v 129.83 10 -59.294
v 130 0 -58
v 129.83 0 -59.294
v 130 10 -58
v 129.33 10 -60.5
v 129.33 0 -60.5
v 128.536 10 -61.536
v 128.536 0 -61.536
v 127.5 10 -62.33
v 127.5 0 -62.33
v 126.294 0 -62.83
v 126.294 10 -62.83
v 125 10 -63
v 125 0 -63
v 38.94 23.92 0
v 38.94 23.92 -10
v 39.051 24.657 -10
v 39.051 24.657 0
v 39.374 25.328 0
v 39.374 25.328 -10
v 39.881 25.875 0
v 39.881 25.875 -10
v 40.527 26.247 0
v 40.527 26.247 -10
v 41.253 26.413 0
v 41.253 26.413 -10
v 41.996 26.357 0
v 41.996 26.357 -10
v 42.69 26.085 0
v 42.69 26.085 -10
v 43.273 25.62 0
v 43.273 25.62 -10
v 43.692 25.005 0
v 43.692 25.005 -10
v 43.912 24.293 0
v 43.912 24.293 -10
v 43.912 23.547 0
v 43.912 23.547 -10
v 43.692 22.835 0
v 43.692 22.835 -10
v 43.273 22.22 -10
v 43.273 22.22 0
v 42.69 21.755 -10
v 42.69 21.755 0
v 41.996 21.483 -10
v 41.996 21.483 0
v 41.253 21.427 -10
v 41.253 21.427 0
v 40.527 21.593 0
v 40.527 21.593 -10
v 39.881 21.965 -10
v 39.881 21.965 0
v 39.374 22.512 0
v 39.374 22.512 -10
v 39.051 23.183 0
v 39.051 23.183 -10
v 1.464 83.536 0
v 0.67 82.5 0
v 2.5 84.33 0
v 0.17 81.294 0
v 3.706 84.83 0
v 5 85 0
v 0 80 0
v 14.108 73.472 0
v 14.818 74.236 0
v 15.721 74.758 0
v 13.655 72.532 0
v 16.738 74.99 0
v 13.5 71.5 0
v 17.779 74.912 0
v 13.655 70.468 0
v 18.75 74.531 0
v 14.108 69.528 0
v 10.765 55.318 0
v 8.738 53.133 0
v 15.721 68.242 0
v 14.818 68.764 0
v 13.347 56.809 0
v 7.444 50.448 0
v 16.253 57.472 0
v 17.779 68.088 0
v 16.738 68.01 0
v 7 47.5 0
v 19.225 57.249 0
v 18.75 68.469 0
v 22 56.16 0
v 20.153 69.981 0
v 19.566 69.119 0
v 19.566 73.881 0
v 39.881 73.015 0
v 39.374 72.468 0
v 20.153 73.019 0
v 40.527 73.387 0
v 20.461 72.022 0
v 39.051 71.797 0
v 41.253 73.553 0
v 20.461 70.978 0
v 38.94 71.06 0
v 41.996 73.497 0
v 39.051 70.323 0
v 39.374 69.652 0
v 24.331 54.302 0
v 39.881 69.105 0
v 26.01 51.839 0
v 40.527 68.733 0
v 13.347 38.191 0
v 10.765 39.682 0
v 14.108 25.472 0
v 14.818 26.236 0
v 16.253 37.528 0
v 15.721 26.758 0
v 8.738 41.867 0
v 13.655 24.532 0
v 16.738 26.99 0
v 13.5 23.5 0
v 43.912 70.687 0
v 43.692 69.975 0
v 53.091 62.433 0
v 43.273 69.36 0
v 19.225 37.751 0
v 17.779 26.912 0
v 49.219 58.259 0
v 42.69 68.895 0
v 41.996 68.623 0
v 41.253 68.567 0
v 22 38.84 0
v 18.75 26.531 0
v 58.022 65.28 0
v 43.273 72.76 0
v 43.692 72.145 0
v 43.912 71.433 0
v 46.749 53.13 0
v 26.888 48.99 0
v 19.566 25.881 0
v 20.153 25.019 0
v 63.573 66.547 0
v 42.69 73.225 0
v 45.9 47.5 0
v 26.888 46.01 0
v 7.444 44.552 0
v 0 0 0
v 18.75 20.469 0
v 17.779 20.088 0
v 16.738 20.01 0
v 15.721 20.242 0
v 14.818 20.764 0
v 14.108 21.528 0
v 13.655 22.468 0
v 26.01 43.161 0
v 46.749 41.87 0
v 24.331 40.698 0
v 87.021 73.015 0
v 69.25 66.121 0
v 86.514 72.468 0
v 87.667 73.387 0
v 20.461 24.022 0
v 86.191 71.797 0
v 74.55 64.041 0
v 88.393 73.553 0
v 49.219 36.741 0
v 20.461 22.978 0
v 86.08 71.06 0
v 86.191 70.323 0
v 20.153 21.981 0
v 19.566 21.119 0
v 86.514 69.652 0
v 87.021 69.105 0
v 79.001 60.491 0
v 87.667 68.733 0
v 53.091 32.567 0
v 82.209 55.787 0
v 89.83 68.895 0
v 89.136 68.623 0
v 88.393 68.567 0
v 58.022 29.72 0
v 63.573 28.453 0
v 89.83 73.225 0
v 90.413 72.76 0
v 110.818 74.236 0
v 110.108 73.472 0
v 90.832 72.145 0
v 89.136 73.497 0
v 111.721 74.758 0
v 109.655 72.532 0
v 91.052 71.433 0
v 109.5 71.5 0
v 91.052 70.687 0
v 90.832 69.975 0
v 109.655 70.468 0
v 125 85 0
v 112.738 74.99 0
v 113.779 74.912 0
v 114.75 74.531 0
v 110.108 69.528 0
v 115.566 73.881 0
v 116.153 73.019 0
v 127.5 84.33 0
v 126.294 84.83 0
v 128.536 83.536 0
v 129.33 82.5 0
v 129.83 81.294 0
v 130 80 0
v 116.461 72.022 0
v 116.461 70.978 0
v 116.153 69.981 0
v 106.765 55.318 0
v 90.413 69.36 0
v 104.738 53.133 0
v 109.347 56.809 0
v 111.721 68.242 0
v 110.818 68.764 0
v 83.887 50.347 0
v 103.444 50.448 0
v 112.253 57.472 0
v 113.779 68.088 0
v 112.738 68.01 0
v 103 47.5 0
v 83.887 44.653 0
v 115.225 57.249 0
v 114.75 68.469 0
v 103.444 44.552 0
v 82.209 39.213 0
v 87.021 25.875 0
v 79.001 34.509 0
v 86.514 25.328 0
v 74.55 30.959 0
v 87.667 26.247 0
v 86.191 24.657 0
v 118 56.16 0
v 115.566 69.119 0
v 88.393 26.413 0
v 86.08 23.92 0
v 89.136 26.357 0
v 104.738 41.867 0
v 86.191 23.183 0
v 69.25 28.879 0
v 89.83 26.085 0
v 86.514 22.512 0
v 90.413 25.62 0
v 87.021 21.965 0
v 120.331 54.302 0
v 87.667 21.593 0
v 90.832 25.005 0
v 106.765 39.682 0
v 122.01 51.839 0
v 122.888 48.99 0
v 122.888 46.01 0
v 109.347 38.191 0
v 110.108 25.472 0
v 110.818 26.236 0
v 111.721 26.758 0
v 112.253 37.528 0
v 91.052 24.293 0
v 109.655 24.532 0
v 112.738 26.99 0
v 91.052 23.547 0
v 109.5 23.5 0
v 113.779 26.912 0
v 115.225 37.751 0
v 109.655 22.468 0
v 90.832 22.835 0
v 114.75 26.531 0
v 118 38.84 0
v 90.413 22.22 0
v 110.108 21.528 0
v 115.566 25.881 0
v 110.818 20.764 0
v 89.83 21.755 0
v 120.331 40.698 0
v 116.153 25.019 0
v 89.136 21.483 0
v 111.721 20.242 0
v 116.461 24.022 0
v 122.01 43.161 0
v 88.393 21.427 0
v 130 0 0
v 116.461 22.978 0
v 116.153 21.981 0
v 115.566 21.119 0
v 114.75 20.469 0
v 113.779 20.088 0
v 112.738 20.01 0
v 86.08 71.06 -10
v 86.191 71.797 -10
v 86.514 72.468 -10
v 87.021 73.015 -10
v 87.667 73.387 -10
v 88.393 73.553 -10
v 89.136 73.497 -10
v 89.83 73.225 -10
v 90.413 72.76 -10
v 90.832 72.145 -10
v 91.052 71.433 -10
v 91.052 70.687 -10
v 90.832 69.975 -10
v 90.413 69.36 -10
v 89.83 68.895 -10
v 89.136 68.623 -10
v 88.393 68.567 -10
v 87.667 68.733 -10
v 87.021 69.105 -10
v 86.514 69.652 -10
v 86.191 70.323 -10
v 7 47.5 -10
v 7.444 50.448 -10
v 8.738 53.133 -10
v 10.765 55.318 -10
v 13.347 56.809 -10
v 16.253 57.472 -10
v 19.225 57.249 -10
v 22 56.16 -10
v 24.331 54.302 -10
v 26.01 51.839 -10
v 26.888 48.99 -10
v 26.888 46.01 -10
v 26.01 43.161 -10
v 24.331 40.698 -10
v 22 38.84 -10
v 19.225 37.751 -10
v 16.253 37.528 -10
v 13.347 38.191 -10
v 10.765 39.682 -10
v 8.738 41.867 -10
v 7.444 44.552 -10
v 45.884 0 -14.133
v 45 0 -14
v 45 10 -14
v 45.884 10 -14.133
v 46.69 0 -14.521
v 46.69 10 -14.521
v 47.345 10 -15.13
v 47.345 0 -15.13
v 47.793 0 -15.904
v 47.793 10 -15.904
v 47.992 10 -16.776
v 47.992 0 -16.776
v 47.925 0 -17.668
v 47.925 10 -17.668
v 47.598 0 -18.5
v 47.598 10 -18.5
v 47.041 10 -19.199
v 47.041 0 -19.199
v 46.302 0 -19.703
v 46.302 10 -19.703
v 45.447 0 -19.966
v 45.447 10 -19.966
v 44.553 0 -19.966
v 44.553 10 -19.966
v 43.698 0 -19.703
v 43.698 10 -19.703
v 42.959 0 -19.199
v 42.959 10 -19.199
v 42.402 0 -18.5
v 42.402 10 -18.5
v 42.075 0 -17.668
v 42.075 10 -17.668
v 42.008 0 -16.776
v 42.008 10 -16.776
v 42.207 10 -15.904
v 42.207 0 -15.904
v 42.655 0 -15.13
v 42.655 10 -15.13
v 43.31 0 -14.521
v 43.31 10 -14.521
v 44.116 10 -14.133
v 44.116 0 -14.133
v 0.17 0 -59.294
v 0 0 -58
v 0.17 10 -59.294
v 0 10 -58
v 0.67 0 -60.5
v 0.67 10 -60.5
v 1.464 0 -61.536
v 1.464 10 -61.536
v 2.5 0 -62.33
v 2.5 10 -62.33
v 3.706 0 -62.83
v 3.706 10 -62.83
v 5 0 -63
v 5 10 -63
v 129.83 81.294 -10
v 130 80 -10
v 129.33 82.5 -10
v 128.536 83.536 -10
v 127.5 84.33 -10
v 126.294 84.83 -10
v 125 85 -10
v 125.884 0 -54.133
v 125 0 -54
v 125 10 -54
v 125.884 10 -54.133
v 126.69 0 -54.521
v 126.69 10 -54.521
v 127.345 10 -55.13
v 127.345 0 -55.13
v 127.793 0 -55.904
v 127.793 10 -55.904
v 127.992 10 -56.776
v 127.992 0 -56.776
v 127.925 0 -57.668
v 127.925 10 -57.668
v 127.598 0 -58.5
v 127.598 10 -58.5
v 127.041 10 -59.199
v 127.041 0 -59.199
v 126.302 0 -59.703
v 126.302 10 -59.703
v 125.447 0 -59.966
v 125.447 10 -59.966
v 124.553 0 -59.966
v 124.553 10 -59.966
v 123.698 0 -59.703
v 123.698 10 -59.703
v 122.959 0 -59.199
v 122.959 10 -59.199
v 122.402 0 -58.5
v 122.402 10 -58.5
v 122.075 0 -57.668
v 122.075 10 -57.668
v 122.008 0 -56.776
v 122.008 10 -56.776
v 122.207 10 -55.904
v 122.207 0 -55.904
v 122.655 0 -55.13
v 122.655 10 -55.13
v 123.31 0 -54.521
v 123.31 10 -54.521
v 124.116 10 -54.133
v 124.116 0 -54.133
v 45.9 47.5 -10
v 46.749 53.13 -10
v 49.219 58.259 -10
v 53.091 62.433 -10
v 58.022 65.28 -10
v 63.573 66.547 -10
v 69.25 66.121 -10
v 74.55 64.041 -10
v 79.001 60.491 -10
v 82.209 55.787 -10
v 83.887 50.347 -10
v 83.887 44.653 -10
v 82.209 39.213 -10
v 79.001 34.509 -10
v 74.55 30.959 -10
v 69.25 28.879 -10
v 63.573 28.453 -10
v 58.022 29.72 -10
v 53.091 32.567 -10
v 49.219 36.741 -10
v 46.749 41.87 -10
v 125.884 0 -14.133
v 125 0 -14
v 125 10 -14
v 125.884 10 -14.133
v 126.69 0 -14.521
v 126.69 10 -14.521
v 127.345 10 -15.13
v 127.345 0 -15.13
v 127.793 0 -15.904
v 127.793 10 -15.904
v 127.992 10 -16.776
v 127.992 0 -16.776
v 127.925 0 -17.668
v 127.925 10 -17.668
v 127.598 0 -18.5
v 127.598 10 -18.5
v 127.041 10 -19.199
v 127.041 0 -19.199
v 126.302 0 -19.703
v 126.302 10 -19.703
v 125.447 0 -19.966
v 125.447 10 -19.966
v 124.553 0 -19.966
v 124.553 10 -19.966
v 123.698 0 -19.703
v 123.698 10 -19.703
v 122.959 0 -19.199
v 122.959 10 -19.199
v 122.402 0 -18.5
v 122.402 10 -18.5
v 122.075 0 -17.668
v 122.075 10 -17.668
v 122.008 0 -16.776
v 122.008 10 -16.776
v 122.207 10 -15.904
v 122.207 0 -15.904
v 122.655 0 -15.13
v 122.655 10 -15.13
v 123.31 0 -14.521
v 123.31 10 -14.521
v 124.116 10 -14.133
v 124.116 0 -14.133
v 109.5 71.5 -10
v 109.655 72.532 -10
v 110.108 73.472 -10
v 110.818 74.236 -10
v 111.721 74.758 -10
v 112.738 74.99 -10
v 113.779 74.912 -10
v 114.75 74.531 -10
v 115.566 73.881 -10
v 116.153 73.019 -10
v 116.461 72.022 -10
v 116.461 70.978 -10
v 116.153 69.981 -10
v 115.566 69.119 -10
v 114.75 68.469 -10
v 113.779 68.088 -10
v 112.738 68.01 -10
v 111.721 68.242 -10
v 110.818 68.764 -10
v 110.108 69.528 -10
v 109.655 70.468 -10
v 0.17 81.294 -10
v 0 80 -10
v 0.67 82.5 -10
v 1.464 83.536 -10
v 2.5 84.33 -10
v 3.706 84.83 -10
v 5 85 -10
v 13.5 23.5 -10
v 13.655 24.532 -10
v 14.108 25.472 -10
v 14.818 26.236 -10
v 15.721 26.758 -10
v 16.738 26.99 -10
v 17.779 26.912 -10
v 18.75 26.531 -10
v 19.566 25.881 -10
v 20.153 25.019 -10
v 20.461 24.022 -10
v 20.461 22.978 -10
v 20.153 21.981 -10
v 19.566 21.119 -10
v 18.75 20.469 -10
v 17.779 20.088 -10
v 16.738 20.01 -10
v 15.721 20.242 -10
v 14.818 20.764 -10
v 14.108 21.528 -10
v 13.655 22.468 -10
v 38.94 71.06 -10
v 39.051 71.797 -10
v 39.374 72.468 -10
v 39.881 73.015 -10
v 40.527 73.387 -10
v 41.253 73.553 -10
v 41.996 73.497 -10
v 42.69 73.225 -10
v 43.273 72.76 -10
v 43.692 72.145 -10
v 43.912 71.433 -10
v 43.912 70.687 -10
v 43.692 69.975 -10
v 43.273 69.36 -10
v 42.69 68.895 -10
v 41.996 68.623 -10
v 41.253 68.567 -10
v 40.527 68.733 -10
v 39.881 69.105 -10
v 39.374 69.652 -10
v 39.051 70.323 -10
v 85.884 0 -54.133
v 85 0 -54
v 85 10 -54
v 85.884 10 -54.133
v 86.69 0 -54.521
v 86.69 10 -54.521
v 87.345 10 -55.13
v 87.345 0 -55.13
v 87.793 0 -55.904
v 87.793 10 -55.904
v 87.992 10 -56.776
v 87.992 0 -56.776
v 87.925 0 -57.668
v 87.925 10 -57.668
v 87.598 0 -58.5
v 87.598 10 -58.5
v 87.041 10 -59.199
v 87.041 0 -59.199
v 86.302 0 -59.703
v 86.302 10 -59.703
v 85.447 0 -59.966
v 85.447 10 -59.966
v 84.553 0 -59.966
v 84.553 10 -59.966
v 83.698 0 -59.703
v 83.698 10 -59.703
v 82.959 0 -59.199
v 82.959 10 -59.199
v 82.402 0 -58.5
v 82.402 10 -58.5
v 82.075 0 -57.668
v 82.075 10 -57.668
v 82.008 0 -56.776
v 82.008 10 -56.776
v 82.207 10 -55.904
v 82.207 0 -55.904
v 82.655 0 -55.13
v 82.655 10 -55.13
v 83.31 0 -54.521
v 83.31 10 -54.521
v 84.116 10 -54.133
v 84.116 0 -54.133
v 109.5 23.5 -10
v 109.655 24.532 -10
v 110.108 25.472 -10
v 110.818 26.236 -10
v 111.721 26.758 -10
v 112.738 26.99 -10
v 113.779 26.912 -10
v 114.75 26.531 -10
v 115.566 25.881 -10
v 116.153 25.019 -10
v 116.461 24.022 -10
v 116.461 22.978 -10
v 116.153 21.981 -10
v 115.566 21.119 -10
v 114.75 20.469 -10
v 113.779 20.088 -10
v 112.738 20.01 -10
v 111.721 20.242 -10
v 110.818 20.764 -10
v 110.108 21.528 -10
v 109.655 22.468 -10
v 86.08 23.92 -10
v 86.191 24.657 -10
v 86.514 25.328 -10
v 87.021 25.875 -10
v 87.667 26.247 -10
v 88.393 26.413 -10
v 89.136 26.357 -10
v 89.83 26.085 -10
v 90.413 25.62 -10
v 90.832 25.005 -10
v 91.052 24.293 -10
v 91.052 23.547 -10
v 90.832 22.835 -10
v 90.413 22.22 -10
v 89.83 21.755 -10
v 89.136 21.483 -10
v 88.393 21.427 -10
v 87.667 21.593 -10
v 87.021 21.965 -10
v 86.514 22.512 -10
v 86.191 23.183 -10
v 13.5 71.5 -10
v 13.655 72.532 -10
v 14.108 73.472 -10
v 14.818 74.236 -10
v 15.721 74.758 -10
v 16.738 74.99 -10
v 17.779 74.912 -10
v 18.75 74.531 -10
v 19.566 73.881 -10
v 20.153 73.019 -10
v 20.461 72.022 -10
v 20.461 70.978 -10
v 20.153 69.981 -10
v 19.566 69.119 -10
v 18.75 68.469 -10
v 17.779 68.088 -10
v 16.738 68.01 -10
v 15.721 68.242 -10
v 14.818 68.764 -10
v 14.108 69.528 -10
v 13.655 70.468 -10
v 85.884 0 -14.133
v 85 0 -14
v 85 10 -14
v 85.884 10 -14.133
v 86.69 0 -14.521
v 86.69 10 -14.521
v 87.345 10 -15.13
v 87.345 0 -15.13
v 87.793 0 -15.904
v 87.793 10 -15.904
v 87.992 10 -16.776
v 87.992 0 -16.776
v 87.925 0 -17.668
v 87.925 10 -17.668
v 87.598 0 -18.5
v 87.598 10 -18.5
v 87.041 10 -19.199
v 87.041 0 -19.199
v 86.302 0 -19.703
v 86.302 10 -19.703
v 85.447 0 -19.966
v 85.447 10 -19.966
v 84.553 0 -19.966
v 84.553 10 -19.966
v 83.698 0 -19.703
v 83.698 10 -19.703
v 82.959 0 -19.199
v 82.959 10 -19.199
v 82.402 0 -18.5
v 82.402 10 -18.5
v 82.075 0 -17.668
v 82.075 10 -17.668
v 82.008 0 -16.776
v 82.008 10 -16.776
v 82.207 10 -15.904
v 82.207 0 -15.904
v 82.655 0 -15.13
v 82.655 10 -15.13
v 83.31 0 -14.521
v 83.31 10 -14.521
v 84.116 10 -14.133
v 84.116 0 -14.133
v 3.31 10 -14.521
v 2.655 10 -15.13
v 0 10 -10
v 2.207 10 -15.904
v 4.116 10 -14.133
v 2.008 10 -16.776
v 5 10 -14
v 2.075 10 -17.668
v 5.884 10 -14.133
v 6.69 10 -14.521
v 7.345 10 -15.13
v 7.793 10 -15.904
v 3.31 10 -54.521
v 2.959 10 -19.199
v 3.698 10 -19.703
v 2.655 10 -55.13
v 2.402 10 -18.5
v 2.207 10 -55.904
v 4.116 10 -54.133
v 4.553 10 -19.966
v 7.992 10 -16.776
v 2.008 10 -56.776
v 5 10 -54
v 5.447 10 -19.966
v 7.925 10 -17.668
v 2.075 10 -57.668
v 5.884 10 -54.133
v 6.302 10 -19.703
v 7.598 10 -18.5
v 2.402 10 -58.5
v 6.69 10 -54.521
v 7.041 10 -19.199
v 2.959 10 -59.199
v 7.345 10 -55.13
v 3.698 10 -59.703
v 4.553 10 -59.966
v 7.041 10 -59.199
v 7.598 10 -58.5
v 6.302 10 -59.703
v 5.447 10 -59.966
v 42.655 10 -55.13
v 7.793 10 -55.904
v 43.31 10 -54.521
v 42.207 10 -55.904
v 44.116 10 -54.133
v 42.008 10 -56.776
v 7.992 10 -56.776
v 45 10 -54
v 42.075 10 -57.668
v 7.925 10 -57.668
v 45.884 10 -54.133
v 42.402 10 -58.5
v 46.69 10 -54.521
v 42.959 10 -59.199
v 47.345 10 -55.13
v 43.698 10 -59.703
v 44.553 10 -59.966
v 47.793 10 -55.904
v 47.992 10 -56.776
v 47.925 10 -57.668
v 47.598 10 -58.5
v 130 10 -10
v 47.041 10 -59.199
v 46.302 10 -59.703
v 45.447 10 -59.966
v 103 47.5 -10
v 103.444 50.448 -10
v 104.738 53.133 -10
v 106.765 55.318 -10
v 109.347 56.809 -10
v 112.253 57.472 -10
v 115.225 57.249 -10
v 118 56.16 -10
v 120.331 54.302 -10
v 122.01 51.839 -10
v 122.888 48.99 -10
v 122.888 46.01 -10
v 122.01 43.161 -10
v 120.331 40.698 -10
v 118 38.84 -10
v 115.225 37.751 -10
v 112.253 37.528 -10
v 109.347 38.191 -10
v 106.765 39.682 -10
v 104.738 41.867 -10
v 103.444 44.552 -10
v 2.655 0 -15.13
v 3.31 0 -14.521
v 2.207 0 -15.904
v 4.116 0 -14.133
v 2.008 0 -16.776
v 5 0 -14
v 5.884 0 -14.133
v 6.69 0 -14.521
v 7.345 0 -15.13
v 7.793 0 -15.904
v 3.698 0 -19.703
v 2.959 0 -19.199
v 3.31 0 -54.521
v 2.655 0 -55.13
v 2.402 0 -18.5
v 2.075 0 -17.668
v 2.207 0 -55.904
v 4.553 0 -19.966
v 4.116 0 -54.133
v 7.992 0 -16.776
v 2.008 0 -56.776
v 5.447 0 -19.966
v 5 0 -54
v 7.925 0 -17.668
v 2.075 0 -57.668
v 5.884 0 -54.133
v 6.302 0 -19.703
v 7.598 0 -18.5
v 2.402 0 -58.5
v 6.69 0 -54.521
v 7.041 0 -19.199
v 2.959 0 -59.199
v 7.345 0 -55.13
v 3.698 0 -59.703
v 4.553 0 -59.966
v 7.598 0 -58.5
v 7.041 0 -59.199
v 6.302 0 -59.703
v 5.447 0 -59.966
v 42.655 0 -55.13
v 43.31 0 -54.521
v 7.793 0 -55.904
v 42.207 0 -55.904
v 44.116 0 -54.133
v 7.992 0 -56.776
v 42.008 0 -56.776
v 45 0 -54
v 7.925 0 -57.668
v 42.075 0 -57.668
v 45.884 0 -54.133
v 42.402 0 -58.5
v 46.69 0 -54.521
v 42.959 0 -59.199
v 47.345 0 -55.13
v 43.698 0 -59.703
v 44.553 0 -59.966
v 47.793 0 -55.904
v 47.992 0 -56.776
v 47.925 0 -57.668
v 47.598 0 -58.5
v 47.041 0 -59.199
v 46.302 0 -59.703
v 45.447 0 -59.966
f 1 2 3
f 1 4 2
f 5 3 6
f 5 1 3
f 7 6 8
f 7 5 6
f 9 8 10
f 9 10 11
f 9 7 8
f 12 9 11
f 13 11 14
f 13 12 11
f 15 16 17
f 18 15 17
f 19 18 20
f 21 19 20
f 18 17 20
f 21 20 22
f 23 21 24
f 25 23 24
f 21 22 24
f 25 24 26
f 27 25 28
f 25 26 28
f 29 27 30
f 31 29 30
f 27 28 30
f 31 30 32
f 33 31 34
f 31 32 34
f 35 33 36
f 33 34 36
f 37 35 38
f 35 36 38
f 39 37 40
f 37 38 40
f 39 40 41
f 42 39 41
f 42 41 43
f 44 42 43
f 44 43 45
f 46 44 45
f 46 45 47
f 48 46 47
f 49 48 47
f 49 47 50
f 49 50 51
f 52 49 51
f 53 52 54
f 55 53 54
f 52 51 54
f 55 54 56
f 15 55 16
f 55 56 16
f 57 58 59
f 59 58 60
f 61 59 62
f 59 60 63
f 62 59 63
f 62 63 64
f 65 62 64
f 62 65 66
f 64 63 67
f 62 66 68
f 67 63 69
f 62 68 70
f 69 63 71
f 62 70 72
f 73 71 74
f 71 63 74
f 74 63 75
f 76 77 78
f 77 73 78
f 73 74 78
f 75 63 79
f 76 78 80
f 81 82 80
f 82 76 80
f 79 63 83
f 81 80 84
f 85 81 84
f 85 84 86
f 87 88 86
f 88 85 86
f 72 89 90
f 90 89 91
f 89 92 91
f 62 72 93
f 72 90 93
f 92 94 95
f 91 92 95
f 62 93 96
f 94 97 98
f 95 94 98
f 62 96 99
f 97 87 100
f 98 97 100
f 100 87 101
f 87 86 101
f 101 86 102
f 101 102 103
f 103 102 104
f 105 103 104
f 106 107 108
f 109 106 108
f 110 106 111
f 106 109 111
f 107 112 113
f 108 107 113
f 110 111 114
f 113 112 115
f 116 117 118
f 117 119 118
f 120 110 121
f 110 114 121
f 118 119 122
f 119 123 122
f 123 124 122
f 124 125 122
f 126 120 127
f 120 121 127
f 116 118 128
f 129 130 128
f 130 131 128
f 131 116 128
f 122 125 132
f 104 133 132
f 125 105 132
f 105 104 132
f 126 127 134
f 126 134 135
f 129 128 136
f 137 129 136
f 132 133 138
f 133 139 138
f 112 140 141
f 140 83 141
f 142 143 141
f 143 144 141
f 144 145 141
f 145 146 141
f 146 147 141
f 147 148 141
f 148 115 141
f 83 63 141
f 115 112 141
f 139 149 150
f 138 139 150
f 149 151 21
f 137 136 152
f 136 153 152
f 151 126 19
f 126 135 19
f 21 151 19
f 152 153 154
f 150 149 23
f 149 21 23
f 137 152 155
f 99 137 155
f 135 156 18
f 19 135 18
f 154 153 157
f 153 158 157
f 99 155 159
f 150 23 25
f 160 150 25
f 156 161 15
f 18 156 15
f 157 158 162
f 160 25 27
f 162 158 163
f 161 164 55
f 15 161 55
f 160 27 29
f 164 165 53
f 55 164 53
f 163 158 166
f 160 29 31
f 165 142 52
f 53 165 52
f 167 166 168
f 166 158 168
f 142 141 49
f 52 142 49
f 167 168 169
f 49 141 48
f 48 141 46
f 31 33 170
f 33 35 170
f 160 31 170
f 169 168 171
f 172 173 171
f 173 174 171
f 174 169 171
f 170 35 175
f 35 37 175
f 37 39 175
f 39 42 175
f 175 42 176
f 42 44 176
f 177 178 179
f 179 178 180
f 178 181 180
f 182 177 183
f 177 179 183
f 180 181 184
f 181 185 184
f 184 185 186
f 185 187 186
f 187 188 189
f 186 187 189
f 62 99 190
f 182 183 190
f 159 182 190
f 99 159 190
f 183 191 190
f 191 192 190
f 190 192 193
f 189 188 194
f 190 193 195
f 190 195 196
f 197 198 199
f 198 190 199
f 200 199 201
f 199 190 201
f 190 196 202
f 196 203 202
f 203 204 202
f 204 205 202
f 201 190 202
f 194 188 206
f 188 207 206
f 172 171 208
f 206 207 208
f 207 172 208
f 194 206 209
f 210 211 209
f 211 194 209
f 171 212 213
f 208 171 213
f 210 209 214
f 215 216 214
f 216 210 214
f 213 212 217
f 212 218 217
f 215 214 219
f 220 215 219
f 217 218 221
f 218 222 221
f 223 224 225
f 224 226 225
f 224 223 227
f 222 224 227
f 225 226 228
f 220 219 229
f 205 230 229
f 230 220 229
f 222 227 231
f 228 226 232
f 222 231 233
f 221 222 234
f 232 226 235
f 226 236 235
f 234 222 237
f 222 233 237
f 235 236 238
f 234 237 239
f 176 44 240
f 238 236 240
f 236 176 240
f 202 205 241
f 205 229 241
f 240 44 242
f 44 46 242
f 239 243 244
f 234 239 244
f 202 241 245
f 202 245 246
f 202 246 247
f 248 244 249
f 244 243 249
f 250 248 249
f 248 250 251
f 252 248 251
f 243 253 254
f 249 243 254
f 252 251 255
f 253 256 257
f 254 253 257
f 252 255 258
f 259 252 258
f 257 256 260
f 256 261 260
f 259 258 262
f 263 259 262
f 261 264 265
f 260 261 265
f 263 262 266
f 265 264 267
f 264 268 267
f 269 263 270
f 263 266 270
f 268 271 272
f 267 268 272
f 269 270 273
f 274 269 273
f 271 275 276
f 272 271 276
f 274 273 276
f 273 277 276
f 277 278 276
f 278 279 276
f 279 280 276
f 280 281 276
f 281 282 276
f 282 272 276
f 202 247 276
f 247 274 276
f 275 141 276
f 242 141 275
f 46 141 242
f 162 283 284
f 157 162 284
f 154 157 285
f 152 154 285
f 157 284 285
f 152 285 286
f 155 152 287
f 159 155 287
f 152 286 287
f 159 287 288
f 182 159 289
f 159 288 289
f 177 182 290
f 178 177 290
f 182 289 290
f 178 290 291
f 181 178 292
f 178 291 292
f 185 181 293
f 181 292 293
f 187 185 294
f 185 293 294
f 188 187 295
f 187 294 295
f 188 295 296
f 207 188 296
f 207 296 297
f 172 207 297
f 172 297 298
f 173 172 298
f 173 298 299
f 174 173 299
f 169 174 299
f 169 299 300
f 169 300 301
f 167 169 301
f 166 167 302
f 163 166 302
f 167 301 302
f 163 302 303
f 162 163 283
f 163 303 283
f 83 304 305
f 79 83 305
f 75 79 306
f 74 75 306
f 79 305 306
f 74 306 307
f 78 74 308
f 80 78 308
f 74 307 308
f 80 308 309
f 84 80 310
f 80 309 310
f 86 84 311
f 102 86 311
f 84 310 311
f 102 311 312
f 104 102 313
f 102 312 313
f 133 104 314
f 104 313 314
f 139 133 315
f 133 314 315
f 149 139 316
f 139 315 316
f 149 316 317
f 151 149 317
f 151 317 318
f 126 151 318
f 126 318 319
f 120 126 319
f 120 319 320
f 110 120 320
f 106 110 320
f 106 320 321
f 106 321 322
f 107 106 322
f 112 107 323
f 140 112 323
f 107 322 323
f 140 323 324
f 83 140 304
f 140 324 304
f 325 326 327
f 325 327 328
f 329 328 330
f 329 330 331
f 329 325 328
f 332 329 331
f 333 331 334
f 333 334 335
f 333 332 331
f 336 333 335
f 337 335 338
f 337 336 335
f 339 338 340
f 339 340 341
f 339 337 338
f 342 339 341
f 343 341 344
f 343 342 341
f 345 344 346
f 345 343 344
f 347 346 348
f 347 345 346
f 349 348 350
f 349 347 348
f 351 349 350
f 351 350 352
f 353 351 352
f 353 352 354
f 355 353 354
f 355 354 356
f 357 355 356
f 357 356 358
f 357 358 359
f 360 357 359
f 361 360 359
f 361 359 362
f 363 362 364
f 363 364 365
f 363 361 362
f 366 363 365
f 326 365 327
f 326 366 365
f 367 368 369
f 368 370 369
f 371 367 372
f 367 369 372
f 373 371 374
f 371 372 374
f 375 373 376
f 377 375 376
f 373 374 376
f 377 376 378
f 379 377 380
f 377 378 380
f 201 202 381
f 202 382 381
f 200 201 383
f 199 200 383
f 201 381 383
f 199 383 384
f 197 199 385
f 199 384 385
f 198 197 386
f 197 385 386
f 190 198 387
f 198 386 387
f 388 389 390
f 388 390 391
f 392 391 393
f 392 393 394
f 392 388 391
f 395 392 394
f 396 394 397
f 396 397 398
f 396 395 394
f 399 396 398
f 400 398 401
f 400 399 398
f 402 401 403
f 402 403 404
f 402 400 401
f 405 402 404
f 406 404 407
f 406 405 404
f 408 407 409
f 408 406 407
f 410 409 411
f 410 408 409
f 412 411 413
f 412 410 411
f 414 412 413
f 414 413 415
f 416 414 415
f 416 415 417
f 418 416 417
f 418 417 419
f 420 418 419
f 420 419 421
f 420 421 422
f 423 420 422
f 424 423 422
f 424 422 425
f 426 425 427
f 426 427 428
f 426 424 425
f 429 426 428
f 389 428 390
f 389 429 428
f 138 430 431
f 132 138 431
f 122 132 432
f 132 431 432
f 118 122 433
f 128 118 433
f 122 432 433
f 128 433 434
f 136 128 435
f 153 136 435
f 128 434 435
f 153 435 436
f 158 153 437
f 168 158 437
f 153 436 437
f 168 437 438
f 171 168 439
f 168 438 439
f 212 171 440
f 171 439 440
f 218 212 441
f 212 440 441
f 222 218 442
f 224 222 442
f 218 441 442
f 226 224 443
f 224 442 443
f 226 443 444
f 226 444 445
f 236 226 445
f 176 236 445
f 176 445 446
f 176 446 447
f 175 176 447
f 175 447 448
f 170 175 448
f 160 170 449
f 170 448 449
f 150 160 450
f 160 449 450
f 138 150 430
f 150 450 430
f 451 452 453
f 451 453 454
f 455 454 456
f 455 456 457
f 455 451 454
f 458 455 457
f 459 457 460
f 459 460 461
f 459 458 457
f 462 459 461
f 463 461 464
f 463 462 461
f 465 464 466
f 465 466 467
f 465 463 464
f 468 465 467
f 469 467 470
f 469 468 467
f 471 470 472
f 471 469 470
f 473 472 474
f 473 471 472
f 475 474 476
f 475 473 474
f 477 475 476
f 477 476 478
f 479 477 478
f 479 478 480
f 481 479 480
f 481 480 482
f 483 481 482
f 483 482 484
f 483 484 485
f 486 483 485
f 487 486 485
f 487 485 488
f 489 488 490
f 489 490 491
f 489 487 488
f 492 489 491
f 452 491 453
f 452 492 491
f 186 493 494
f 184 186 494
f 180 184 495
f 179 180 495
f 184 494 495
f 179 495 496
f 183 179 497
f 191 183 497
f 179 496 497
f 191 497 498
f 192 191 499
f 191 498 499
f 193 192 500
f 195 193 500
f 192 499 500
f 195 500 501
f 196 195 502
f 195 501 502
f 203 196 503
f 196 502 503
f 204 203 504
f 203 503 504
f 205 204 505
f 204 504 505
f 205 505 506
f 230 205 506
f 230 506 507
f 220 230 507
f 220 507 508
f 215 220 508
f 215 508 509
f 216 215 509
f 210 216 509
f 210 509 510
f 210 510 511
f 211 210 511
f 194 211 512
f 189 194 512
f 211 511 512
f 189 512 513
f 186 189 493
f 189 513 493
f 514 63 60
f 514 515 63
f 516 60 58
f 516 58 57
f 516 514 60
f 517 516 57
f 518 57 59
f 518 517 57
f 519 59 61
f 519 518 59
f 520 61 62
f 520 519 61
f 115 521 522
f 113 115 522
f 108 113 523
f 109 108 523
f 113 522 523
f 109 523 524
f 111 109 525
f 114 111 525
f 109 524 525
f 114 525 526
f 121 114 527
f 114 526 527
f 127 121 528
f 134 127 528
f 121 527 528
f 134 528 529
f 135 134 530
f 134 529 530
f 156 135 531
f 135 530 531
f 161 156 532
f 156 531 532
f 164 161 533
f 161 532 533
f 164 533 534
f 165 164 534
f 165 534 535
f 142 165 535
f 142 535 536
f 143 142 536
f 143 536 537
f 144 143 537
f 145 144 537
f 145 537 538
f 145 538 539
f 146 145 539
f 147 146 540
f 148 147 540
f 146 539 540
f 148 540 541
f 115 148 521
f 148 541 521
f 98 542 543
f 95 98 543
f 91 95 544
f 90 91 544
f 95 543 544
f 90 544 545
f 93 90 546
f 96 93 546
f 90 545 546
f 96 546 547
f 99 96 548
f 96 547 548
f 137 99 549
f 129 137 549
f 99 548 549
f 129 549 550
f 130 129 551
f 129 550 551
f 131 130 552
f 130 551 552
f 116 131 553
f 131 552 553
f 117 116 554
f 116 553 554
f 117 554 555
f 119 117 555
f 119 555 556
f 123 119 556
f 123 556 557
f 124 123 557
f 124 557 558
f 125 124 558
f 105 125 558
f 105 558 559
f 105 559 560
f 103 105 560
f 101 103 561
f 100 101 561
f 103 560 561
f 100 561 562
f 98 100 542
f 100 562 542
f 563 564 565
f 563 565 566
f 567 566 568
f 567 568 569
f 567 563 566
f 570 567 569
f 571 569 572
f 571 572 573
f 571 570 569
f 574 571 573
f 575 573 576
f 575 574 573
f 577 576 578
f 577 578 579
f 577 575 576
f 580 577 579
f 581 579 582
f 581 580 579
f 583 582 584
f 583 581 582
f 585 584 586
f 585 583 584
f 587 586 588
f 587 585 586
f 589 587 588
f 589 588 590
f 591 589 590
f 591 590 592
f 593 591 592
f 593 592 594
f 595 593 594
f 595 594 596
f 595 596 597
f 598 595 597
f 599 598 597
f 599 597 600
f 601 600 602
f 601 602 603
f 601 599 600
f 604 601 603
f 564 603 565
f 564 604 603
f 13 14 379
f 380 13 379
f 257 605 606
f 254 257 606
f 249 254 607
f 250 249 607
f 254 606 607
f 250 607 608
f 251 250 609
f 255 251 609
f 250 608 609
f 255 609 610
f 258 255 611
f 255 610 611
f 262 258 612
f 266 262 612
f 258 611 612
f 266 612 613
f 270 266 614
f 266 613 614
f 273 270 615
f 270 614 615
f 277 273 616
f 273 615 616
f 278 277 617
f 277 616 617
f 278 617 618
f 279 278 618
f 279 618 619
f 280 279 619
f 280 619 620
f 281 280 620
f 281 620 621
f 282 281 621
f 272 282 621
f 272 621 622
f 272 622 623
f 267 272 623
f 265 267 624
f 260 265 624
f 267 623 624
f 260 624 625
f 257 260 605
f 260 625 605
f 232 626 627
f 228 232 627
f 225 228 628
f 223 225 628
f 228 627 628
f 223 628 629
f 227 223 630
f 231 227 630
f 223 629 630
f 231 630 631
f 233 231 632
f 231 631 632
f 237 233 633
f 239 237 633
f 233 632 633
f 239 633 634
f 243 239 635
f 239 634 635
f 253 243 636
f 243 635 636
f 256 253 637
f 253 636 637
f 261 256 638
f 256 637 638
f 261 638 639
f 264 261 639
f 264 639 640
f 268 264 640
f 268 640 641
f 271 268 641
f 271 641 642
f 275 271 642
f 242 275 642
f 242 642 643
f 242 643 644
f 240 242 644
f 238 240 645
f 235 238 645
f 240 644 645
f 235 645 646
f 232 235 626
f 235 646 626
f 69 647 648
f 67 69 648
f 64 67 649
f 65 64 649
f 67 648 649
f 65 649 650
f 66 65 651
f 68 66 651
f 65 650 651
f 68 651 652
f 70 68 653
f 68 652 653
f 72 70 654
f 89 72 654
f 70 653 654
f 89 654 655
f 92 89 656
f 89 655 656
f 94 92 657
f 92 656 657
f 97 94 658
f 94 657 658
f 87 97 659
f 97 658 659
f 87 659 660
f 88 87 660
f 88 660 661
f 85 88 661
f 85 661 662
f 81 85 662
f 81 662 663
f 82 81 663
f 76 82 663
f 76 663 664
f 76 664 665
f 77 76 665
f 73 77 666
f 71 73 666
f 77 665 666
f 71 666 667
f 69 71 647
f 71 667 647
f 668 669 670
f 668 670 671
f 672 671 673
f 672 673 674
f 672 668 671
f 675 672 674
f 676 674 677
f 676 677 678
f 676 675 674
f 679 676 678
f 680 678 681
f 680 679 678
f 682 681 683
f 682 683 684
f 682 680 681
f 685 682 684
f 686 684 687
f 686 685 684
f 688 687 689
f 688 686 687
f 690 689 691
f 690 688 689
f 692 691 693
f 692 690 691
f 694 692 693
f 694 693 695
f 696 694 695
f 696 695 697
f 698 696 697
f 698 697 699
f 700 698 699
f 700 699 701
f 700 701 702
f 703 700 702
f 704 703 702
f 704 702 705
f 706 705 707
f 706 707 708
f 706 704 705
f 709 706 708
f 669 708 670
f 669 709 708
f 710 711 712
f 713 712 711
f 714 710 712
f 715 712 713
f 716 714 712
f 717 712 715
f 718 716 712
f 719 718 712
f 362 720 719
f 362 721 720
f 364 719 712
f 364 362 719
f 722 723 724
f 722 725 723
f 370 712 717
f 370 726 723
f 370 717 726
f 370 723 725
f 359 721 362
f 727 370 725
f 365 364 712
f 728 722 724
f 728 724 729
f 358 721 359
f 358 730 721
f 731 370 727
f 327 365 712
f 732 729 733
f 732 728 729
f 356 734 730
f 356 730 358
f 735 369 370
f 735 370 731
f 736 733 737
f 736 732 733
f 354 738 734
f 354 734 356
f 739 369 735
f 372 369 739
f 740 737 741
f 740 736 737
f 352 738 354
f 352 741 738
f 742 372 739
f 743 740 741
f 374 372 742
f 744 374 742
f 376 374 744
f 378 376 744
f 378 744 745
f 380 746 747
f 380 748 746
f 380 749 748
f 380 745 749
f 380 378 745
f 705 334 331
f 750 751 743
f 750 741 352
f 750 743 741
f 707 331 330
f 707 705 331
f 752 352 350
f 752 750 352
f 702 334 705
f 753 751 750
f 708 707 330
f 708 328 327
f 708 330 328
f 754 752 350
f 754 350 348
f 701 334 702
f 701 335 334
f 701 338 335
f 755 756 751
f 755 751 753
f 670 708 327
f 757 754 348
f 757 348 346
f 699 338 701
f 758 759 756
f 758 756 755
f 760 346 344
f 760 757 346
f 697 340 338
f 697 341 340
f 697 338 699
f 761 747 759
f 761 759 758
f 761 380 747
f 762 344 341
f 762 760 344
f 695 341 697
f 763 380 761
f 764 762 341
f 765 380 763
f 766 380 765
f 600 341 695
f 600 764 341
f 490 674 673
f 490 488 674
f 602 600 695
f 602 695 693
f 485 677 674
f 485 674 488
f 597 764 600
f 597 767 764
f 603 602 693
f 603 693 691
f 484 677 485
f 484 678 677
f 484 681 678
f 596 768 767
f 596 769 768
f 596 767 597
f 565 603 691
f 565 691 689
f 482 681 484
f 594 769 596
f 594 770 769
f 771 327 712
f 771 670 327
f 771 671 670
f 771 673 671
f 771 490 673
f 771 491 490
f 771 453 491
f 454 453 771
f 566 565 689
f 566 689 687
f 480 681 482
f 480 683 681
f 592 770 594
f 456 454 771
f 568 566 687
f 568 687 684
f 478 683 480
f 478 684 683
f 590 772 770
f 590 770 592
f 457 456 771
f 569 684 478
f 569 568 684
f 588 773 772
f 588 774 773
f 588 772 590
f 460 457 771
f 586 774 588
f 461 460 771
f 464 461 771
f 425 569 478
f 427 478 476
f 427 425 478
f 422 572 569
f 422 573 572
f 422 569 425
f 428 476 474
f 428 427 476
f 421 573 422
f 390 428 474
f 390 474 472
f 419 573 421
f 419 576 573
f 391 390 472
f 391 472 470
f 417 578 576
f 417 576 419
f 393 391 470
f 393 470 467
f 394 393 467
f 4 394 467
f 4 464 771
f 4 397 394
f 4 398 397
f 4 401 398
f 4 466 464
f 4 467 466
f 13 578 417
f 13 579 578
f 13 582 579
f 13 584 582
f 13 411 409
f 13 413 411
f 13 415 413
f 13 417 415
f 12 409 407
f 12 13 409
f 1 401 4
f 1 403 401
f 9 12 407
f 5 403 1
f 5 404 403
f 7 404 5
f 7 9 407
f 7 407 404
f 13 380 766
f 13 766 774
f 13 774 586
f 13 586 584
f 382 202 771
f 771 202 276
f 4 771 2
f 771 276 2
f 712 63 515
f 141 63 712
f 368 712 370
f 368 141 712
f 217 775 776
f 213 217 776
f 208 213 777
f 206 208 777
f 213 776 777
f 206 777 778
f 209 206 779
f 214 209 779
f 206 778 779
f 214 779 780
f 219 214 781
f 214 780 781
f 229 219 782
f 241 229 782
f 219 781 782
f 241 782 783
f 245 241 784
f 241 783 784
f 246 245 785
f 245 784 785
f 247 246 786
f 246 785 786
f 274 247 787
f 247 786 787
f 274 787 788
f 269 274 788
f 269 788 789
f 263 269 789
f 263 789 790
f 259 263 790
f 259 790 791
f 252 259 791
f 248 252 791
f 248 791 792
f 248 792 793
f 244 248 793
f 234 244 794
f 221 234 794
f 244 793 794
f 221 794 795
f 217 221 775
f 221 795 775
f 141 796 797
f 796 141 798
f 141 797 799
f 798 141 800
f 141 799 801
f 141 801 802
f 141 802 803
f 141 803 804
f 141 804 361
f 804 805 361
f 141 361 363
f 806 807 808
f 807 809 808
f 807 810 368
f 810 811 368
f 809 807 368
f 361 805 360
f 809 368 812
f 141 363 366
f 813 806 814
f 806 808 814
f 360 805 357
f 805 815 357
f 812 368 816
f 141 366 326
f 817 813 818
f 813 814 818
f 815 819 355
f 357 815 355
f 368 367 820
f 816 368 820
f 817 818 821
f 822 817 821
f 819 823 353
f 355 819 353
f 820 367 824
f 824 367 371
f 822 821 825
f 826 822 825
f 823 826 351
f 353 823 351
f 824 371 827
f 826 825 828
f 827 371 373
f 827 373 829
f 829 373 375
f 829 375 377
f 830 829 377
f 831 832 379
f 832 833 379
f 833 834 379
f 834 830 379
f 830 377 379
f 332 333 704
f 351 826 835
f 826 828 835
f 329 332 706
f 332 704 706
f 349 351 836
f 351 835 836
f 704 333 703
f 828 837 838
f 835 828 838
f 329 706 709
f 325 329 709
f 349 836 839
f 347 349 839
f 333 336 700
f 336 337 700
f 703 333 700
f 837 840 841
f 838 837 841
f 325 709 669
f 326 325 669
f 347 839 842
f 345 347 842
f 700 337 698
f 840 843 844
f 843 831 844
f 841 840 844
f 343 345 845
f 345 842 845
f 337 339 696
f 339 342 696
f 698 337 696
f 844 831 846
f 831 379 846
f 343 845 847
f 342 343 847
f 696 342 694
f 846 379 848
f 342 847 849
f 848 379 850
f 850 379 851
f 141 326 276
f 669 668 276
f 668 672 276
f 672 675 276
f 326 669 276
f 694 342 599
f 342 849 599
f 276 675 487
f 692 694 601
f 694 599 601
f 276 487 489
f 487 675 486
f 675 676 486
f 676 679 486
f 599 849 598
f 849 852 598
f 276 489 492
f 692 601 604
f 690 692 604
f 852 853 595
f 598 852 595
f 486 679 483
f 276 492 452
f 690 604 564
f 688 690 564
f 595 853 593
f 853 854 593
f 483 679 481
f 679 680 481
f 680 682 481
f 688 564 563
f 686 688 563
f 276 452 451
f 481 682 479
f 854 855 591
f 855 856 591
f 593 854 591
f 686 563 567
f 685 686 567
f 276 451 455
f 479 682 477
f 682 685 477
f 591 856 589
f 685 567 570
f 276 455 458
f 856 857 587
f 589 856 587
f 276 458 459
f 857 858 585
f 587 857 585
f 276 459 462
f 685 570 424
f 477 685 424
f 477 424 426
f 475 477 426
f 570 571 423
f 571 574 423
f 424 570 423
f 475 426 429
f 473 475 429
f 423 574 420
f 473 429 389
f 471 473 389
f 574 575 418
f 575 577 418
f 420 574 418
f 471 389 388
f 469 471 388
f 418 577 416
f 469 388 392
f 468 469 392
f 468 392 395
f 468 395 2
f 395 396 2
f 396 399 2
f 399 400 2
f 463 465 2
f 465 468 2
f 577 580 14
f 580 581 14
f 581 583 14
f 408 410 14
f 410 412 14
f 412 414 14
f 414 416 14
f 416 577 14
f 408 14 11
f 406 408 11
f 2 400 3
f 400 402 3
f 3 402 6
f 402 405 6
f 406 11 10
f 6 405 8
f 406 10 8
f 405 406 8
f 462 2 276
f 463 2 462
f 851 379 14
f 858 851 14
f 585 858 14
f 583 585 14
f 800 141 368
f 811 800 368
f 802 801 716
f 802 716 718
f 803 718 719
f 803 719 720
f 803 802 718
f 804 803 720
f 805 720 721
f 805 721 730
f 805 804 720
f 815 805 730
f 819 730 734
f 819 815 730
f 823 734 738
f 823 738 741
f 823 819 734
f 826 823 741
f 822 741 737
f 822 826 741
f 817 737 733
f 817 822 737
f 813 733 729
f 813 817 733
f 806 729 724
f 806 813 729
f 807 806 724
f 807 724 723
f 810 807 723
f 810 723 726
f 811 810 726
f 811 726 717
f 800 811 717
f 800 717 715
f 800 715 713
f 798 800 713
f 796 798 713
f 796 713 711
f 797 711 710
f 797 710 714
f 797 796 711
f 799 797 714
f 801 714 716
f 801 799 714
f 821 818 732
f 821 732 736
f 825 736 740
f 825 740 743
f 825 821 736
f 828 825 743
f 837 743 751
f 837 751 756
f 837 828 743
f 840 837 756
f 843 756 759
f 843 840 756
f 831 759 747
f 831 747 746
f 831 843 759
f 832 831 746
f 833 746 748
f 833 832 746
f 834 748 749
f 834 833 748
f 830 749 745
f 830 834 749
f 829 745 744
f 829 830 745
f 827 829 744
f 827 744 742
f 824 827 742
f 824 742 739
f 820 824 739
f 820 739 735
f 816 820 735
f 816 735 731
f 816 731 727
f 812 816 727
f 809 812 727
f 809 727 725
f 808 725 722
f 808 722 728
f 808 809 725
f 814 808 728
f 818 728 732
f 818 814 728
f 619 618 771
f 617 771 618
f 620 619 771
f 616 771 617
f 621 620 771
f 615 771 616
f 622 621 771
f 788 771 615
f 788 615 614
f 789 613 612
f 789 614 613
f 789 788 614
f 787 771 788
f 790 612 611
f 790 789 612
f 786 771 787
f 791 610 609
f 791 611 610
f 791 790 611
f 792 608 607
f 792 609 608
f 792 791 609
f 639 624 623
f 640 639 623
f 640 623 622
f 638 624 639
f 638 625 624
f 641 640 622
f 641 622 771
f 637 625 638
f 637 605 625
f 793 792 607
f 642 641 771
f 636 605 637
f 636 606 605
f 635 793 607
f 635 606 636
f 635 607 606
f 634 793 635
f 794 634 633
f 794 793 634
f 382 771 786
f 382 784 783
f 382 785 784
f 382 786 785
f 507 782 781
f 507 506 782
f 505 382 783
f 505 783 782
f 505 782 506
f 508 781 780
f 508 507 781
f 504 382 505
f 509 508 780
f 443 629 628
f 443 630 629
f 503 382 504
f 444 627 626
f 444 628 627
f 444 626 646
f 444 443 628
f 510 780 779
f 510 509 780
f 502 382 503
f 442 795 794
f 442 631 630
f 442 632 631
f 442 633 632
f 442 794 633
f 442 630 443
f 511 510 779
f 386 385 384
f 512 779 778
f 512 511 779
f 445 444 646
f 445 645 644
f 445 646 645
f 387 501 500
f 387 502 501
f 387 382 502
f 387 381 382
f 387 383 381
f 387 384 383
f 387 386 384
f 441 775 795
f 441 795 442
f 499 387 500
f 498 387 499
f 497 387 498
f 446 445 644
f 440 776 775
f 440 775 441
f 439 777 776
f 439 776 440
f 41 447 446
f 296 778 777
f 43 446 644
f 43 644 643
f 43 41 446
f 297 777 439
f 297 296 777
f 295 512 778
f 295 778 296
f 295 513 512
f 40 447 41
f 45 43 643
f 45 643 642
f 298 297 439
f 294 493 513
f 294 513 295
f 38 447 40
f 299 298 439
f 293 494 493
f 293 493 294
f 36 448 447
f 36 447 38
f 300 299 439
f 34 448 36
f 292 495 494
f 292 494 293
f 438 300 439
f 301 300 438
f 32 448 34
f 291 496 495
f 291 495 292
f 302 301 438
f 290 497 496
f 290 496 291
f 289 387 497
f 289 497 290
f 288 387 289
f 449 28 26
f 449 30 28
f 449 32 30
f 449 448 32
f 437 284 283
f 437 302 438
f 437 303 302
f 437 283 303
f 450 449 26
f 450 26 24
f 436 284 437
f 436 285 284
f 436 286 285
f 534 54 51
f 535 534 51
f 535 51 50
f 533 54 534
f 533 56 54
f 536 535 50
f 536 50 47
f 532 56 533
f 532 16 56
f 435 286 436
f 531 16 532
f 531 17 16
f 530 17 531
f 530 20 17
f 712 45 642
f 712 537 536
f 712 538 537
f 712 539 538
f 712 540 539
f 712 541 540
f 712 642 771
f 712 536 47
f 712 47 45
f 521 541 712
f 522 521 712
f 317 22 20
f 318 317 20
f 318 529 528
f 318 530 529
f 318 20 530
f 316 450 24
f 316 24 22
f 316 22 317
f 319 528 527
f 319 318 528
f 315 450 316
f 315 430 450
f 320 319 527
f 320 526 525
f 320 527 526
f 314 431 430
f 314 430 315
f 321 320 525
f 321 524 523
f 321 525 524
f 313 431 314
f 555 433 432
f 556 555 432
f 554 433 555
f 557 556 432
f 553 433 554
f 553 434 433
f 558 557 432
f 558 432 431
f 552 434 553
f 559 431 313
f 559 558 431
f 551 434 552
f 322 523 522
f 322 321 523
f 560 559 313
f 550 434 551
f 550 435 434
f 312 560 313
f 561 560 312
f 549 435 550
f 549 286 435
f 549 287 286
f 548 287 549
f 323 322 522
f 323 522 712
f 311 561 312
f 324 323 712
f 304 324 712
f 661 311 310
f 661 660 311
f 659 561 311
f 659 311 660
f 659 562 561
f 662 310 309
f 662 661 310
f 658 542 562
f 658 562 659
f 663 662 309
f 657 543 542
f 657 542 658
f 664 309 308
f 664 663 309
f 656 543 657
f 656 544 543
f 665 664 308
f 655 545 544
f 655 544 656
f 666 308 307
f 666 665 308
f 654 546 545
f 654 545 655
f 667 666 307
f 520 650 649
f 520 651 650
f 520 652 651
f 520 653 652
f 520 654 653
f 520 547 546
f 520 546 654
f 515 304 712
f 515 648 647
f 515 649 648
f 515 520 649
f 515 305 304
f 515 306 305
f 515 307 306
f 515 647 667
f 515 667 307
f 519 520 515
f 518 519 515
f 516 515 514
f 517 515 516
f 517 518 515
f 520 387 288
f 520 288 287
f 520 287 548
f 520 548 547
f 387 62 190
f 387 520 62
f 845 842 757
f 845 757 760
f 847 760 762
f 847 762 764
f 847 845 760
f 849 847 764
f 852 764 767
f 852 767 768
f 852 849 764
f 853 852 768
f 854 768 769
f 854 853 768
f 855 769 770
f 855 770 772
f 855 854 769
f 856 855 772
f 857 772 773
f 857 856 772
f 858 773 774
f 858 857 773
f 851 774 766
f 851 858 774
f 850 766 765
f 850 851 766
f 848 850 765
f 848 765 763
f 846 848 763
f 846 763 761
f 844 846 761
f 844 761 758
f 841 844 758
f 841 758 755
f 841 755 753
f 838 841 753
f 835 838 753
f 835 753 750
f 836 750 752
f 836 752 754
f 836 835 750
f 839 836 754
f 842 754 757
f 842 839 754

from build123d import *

# Parameters (mm, degrees)
SKETCH1_R           = 3
SKETCH1_W           = 130
SKETCH1_H           = 10
BOSS_EXTRUDE1_DEPTH = 10
SKETCH2_W           = 130
SKETCH2_H           = 8.023003322
BOSS_EXTRUDE2_DEPTH = 75
FILLET1_R           = 5
SKETCH3_W           = 130
SKETCH3_H           = 8.023003322
CUT_EXTRUDE1_DEPTH  = 75
SKETCH4_W           = 130
SKETCH4_H           = 10
CUT_EXTRUDE2_DEPTH  = 37
SKETCH5_W           = 130
SKETCH5_H           = 10
BOSS_EXTRUDE4_DEPTH = 75
FILLET2_R           = 5
SKETCH6_R           = 10
SKETCH6_R_2         = 7.5
SKETCH6_R_3         = 3.5
SKETCH6_R_4         = 2.5
CUT_EXTRUDE3_DEPTH  = 10
SKETCH7_R           = 19.1
CUT_EXTRUDE4_DEPTH  = 10
SKETCH8_R           = 3.5
BOSS_EXTRUDE5_DEPTH = 10


with BuildPart() as part:
    # Sketch1 → Boss-Extrude1 (new body)
    # profile 1 of 3: a face of its own
    with BuildSketch(Plane(origin=(0, 0, 0), x_dir=(1, 0, 0), z_dir=(0, 1, 0))):
        Polygon((0, 63), (0, 0), (5, 0), (130, 0), (130, 63), align=None)
        with Locations(Location((5, 17, 0), (0, 0, 270))):
            Circle(SKETCH1_R, mode=Mode.SUBTRACT)
        with Locations(Location((45, 17, 0), (0, 0, 270))):
            Circle(SKETCH1_R, mode=Mode.SUBTRACT)
        with Locations(Location((5, 57, 0), (0, 0, 270))):
            Circle(SKETCH1_R, mode=Mode.SUBTRACT)
        with Locations(Location((45, 57, 0), (0, 0, 270))):
            Circle(SKETCH1_R, mode=Mode.SUBTRACT)
        with Locations(Location((85, 17, 0), (0, 0, 270))):
            Circle(SKETCH1_R, mode=Mode.SUBTRACT)
        with Locations(Location((125, 17, 0), (0, 0, 270))):
            Circle(SKETCH1_R, mode=Mode.SUBTRACT)
        with Locations(Location((85, 57, 0), (0, 0, 270))):
            Circle(SKETCH1_R, mode=Mode.SUBTRACT)
        with Locations(Location((125, 57, 0), (0, 0, 270))):
            Circle(SKETCH1_R, mode=Mode.SUBTRACT)
    # profile 2 of 3: a face of its own
    with BuildSketch(Plane(origin=(0, 0, 0), x_dir=(1, 0, 0), z_dir=(0, 1, 0))):
        Polygon((5, 0), (0, 0), (0, -27), (130, -27), (130, 0), align=None)
    # profile 3 of 3: a face of its own
    with BuildSketch(Plane(origin=(0, 0, 0), x_dir=(1, 0, 0), z_dir=(0, 1, 0))):
        with Locations((65, -32)):
            Rectangle(SKETCH1_W, SKETCH1_H)
    extrude(amount=BOSS_EXTRUDE1_DEPTH)

    # Sketch2 → Boss-Extrude2 (add)
    with BuildSketch(Plane(origin=(0, 10, 0), x_dir=(1, 0, 0), z_dir=(0, 1, 0))):
        with Locations((65, -32.988498339)):
            Rectangle(SKETCH2_W, SKETCH2_H)
    extrude(amount=BOSS_EXTRUDE2_DEPTH)

    # Fillet1
    fillet1_edges = [part.edges().sort_by_distance(p)[0] for p in [
        (0, 85, 32.988498339),
        (130, 85, 32.988498339),
        (130, 5, -63),
        (0, 5, -63),
    ]]
    fillet(fillet1_edges, radius=FILLET1_R)

    # Sketch3 → Cut-Extrude1 (cut)
    with BuildSketch(Plane(origin=(0, 85, 0), x_dir=(1, 0, 0), z_dir=(0, 1, 0))):
        with Locations((65, -32.988498339)):
            Rectangle(SKETCH3_W, SKETCH3_H)
    extrude(amount=-CUT_EXTRUDE1_DEPTH, mode=Mode.SUBTRACT)

    # Sketch4 → Cut-Extrude2 (cut)
    with BuildSketch(Plane.XY.offset(37)):
        with Locations((65, 5)):
            Rectangle(SKETCH4_W, SKETCH4_H)
    extrude(amount=-CUT_EXTRUDE2_DEPTH, mode=Mode.SUBTRACT)

    # Sketch5 → Boss-Extrude4 (add)
    with BuildSketch(Plane(origin=(0, 10, 0), x_dir=(1, 0, 0), z_dir=(0, 1, 0))):
        with Locations((65, 5)):
            Rectangle(SKETCH5_W, SKETCH5_H)
    extrude(amount=BOSS_EXTRUDE4_DEPTH)

    # Fillet2
    fillet2_edges = [part.edges().sort_by_distance(p)[0] for p in [
        (130, 85, -5),
        (0, 85, -5),
    ]]
    fillet(fillet2_edges, radius=FILLET2_R)

    # Sketch6 → Cut-Extrude3 (cut)
    with BuildSketch(Plane(origin=(0, 0, -10), x_dir=(-1, 0, 0), z_dir=(0, 0, -1))):
        with Locations((-113, 47.5)):
            Circle(SKETCH6_R)
        with Locations((-65, 47.5)):
            Circle(SKETCH6_R_2)
        with Locations((-17, 47.5)):
            Circle(SKETCH6_R)
        with Locations((-113, 71.5)):
            Circle(SKETCH6_R_3)
        with Locations((-65, 74.04)):
            Circle(SKETCH6_R_3)
        with Locations((-17, 71.5)):
            Circle(SKETCH6_R_3)
        with Locations((-17, 23.5)):
            Circle(SKETCH6_R_3)
        with Locations((-65, 21)):
            Circle(SKETCH6_R_3)
        with Locations((-113, 23.5)):
            Circle(SKETCH6_R_3)
        with Locations((-88.58, 71.06)):
            Circle(SKETCH6_R_4)
        with Locations((-41.44, 71.06)):
            Circle(SKETCH6_R_4)
        with Locations((-41.44, 23.92)):
            Circle(SKETCH6_R_4)
        with Locations((-88.58, 23.92)):
            Circle(SKETCH6_R_4)
    extrude(amount=-CUT_EXTRUDE3_DEPTH, mode=Mode.SUBTRACT)

    # Sketch7 → Cut-Extrude4 (cut)
    with BuildSketch(Plane(origin=(0, 0, -10), x_dir=(-1, 0, 0), z_dir=(0, 0, -1))):
        with Locations((-65, 47.5)):
            Circle(SKETCH7_R)
    extrude(amount=-CUT_EXTRUDE4_DEPTH, mode=Mode.SUBTRACT)

    # Sketch8 → Boss-Extrude5 (add)
    with BuildSketch(Plane(origin=(0, 0, -10), x_dir=(-1, 0, 0), z_dir=(0, 0, -1))):
        with Locations((-65, 74.04)):
            Circle(SKETCH8_R)
        with Locations((-65, 21)):
            Circle(SKETCH8_R)
    extrude(amount=-BOSS_EXTRUDE5_DEPTH)


solid = part.part
